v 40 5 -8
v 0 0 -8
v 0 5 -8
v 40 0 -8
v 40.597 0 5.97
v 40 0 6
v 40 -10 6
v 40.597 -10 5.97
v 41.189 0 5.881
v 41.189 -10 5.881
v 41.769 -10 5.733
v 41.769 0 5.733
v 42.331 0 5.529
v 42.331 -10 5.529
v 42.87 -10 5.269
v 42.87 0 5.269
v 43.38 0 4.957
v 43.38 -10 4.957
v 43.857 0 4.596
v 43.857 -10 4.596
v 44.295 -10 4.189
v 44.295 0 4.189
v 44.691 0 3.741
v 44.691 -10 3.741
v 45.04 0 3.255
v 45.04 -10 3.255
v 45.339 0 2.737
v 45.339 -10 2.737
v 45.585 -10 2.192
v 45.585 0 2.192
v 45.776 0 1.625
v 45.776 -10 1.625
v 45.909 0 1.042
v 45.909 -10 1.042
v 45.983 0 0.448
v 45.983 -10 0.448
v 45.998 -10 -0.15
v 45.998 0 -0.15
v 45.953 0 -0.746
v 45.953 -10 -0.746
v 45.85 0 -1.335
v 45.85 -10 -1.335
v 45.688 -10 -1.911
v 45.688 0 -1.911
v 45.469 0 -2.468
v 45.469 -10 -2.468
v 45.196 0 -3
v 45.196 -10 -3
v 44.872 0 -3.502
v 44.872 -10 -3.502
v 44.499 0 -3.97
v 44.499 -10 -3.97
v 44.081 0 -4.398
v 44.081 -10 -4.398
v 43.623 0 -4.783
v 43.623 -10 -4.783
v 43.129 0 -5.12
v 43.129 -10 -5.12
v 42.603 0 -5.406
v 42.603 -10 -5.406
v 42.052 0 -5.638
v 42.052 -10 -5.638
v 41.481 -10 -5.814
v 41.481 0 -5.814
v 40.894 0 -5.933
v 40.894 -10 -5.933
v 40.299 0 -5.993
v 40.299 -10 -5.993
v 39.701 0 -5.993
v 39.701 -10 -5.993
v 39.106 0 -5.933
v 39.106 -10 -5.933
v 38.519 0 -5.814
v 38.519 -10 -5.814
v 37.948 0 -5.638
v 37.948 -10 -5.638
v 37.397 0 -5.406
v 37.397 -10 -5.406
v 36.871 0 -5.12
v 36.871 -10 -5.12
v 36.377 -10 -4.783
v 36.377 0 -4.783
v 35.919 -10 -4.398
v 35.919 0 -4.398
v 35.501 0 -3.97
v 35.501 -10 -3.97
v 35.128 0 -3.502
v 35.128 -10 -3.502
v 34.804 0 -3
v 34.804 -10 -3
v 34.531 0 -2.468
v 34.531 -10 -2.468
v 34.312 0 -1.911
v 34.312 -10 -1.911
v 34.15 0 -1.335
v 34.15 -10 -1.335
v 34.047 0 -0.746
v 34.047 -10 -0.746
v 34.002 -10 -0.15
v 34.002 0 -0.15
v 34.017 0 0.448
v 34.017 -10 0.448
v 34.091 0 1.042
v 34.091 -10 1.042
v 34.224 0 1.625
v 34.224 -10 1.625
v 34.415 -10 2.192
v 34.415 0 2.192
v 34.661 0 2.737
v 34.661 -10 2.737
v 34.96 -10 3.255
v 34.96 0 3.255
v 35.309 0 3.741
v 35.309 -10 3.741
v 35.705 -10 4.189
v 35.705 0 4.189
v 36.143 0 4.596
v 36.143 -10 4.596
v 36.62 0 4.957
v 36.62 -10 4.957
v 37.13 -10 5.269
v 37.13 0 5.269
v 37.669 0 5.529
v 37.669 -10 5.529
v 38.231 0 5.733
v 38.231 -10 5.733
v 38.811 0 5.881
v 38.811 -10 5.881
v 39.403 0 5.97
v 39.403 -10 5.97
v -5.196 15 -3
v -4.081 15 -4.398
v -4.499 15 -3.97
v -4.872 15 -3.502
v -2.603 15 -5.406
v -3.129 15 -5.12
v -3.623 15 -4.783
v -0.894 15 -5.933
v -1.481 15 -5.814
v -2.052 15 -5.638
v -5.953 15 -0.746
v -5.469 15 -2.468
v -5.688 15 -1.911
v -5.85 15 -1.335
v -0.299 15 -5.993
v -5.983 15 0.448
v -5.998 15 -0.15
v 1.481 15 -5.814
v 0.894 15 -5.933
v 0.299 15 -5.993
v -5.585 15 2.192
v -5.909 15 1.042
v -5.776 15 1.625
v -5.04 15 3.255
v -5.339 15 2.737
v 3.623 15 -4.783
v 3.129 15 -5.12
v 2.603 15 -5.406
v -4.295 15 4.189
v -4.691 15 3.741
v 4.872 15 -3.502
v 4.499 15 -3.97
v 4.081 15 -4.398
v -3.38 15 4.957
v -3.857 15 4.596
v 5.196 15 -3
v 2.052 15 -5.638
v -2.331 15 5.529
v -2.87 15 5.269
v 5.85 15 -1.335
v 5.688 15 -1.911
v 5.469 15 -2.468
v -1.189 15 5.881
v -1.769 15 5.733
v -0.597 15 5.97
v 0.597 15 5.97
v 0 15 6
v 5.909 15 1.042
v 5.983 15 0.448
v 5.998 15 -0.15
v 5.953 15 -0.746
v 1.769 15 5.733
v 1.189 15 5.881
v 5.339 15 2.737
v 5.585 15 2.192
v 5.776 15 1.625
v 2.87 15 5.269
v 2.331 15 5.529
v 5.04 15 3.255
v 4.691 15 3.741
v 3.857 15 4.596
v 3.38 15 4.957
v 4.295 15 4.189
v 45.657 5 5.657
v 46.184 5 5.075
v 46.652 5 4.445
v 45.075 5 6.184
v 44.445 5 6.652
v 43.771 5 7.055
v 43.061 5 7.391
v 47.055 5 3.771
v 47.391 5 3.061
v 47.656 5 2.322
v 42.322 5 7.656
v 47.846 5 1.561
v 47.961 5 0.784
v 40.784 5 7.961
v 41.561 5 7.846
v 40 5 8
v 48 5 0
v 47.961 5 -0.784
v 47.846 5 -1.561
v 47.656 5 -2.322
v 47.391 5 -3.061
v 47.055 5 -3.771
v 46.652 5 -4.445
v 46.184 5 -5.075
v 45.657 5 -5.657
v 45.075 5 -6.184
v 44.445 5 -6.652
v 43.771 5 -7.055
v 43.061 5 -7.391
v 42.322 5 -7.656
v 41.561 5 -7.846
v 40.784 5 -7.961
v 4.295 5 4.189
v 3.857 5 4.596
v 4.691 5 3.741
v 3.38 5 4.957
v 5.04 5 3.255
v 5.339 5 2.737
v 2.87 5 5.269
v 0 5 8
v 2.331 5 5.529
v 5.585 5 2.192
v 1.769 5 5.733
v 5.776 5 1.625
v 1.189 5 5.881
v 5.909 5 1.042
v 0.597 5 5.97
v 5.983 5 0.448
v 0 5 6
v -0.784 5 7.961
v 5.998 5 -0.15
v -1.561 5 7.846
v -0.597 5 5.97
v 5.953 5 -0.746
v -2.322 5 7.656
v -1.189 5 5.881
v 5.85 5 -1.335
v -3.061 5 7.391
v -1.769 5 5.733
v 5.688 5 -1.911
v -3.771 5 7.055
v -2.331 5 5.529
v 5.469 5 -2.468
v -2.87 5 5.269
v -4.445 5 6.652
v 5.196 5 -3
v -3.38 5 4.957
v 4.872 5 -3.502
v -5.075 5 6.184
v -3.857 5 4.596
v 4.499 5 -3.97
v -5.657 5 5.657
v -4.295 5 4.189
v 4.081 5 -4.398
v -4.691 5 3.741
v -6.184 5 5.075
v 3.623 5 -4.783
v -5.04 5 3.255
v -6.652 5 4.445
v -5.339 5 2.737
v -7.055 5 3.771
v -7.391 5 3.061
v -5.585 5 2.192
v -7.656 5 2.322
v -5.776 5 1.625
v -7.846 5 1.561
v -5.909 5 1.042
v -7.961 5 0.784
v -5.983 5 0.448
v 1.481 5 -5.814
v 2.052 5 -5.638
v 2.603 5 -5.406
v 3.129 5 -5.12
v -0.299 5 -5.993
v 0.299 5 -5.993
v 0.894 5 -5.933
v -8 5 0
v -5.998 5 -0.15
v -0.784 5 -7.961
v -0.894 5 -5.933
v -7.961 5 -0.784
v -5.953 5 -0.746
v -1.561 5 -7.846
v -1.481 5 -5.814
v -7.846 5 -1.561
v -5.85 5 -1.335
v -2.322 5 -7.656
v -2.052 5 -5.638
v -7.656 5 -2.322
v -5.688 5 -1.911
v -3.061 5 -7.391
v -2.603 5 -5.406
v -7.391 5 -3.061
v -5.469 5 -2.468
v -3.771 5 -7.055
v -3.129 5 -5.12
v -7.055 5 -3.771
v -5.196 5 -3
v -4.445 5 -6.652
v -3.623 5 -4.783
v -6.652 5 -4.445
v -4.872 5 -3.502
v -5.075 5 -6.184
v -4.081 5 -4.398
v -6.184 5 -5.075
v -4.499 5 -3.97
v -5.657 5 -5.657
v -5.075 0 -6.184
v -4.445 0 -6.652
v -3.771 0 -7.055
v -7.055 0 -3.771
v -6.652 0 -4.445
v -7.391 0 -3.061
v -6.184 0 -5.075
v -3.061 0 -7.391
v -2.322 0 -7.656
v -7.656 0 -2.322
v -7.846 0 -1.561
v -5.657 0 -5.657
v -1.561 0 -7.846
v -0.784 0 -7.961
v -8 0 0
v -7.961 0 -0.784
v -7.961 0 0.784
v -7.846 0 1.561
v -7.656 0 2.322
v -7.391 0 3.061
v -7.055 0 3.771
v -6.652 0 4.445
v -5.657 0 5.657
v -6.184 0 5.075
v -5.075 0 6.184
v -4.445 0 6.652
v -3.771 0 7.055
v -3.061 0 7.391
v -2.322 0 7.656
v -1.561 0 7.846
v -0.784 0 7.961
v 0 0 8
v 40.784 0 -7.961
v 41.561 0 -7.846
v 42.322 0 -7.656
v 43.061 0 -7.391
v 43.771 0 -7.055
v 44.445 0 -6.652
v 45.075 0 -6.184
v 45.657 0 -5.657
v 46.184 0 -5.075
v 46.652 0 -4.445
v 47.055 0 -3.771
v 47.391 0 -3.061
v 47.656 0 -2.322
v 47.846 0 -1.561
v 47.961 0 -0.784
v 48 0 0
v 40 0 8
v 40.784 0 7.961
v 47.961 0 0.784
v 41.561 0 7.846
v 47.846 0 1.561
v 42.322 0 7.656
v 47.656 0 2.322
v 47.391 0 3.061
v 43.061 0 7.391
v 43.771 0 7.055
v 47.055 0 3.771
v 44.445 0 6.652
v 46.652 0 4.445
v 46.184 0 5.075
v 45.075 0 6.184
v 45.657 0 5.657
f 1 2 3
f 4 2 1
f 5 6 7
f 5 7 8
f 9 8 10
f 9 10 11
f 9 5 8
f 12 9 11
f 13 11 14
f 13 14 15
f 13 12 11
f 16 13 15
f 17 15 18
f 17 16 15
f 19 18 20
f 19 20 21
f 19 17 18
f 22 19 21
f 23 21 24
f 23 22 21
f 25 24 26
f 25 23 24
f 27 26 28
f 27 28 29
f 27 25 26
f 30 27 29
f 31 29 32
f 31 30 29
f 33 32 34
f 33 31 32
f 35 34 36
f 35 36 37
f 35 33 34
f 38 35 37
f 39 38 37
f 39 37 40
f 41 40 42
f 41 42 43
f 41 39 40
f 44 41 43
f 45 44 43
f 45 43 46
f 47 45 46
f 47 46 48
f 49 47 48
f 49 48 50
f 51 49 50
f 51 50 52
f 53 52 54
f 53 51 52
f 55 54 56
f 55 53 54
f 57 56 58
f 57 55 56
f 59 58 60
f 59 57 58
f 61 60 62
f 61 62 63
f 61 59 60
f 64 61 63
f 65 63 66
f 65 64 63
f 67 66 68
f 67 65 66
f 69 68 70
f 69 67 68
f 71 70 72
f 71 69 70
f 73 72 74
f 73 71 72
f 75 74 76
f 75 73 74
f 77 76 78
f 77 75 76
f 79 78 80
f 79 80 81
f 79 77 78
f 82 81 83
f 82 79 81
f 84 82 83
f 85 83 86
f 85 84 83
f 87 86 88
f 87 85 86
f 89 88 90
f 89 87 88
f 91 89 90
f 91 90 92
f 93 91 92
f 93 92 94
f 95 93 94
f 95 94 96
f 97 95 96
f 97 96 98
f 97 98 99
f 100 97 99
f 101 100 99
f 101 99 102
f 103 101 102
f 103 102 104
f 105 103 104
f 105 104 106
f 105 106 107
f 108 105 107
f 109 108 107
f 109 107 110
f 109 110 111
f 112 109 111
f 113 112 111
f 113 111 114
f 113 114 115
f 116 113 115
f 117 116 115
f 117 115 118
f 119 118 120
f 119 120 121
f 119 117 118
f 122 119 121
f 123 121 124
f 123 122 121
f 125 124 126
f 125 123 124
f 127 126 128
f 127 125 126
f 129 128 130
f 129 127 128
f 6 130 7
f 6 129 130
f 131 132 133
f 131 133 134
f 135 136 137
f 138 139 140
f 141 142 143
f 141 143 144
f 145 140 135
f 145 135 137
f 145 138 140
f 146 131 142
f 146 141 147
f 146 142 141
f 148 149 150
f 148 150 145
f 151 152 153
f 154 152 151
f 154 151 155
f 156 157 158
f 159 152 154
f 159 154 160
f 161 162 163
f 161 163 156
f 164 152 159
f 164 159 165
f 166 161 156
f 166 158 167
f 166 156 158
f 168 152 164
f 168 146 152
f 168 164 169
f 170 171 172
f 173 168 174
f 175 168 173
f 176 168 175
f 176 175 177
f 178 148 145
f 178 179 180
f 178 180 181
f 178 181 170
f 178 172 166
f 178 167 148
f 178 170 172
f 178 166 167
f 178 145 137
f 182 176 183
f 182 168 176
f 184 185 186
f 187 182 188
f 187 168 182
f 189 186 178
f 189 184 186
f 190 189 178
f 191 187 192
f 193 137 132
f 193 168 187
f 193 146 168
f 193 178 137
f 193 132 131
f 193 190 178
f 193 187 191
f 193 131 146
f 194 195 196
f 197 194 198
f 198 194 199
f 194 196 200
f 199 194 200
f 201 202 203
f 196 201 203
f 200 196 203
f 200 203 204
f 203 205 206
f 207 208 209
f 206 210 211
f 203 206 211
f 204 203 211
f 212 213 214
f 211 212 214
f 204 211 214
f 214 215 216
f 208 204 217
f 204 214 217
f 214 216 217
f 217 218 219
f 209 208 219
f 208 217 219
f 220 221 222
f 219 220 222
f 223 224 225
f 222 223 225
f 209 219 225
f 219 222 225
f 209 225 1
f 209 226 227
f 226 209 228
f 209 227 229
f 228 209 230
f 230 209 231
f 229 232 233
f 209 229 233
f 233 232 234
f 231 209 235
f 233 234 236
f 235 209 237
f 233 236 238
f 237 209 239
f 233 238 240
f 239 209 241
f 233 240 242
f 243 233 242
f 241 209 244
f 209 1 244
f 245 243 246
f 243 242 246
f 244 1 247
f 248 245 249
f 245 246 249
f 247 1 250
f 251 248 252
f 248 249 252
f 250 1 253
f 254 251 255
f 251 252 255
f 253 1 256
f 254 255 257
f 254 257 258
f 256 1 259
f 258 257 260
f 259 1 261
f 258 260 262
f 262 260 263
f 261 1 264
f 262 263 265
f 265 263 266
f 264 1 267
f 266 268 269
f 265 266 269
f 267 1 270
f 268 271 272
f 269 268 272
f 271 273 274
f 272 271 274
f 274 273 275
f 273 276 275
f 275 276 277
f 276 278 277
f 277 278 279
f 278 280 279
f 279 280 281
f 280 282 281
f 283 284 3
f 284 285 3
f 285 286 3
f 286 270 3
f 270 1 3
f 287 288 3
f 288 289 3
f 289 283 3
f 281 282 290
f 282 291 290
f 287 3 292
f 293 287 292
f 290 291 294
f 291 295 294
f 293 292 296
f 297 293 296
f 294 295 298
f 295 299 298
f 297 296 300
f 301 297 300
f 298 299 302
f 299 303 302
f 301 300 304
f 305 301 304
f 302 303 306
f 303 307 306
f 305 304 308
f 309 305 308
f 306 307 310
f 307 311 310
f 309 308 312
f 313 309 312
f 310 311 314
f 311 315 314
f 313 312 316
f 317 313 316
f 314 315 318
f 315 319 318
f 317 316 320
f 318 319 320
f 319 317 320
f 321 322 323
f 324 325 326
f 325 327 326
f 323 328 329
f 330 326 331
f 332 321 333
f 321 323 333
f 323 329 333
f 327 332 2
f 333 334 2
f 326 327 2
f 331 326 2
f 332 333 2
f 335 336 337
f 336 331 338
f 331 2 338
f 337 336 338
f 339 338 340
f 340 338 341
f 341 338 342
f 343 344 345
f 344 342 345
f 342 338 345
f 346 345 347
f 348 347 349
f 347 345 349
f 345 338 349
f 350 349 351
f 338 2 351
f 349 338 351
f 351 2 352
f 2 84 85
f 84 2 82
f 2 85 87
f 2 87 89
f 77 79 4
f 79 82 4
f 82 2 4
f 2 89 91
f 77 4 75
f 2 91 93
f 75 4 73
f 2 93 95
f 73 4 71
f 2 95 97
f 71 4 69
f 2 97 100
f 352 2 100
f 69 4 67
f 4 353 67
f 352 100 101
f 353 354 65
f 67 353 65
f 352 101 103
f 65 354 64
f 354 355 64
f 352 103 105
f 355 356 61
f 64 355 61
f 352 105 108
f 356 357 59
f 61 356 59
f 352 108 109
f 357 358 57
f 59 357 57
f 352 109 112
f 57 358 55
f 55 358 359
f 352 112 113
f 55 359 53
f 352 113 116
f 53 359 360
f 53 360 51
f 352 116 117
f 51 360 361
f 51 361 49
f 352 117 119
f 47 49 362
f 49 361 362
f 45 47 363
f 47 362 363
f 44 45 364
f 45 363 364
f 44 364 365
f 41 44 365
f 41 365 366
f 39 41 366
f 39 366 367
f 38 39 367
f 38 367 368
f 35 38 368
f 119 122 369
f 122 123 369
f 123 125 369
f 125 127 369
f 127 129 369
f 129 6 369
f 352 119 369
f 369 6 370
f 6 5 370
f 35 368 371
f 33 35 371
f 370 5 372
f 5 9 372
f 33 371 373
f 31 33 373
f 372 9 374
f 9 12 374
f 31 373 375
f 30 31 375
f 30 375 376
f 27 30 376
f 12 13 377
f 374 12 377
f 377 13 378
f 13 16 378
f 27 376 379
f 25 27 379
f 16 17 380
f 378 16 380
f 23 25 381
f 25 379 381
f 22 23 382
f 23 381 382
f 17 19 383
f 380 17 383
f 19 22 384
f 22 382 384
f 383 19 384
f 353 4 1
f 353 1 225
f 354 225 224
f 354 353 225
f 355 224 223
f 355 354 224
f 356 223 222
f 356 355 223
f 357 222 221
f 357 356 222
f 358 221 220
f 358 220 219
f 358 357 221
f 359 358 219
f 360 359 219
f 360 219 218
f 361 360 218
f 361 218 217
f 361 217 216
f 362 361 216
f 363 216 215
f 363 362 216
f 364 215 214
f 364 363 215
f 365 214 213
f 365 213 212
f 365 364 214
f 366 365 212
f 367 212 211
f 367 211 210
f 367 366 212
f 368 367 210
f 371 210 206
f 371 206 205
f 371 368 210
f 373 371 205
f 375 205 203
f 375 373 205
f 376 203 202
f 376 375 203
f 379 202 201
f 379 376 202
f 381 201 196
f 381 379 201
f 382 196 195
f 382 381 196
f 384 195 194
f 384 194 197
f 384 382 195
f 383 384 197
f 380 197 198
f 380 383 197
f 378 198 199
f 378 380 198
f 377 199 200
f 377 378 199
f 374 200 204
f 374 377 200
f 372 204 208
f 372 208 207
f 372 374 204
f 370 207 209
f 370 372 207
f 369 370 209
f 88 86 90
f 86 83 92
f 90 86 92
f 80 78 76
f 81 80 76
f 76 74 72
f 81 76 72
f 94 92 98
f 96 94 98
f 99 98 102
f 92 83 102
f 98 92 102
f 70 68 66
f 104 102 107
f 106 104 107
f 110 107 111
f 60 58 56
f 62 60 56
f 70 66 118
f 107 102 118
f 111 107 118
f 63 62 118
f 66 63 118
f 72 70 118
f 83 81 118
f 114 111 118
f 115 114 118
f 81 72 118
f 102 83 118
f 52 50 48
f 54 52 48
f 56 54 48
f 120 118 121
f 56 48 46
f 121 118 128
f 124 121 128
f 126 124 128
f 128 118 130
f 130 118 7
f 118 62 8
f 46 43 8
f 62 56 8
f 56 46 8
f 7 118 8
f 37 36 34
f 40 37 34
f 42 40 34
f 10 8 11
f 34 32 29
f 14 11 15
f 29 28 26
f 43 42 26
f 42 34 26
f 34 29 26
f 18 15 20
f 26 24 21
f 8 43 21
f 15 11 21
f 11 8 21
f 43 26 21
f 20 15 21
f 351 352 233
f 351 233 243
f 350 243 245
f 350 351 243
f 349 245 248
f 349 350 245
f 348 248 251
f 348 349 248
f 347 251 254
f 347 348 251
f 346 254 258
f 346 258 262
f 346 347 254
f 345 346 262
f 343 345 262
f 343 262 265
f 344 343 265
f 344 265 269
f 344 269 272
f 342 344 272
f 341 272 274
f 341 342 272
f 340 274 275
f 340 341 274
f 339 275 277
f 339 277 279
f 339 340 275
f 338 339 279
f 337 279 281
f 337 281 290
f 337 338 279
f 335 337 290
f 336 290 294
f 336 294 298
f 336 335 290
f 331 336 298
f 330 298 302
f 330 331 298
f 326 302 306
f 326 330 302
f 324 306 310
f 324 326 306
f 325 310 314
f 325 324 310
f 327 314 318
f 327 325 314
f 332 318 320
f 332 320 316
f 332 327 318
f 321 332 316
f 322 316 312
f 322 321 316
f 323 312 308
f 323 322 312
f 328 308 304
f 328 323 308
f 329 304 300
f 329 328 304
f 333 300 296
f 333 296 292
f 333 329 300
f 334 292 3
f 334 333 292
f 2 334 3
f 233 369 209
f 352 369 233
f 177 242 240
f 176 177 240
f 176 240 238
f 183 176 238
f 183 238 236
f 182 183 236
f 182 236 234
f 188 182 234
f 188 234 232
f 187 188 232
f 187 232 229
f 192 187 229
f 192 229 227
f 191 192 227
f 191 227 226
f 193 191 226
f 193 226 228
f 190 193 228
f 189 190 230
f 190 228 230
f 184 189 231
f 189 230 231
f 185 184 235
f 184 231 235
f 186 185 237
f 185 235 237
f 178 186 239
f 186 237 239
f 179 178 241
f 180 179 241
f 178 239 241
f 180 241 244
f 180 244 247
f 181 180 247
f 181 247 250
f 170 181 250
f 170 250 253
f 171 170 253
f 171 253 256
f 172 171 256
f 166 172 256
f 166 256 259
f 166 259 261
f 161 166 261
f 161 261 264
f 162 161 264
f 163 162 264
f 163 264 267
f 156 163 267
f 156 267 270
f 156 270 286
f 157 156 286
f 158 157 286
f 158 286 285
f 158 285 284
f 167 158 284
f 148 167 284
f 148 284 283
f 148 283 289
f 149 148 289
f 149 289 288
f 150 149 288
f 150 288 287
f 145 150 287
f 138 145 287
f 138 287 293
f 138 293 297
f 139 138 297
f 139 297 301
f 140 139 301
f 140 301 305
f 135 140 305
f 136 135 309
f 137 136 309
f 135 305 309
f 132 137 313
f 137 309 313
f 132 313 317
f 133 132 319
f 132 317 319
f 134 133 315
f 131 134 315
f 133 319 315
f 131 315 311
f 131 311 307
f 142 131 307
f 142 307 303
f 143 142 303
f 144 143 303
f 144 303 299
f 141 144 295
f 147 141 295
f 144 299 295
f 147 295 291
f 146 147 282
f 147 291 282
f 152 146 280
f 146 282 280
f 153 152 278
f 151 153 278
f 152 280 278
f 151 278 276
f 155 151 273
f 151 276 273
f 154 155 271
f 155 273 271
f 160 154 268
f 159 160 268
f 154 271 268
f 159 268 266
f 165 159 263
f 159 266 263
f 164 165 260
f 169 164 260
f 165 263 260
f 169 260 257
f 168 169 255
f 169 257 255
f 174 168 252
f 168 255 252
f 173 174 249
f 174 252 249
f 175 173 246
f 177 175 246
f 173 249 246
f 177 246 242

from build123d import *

# Parameters (mm, degrees)
BOSS_EXTRUDE1_DEPTH = 5
SKETCH1_3_R         = 6
BOSS_EXTRUDE2_DEPTH = 15
SKETCH1_4_R         = 6
BOSS_EXTRUDE3_DEPTH = 10


with BuildPart() as part:
    # Sketch1 → Boss-Extrude1 (new body)
    with BuildSketch(Plane(origin=(0, 0, 0), x_dir=(1, 0, 0), z_dir=(0, 1, 0))):
        with BuildLine():
            Line((40, 8), (0, 8))
            ThreePointArc((0, 8), (-8, 0), (0, -8))
            Line((0, -8), (40, -8))
            ThreePointArc((40, -8), (48, 0), (40, 8))
        make_face()
    extrude(amount=BOSS_EXTRUDE1_DEPTH)

    # Sketch1<3> → Boss-Extrude2 (add)
    with BuildSketch(Plane(origin=(0, 0, 0), x_dir=(1, 0, 0), z_dir=(0, 1, 0))):
        Circle(SKETCH1_3_R)
    extrude(amount=BOSS_EXTRUDE2_DEPTH)

    # Sketch1<4> → Boss-Extrude3 (add)
    with BuildSketch(Plane(origin=(0, 0, 0), x_dir=(1, 0, 0), z_dir=(0, 1, 0))):
        with Locations((40, 0)):
            Circle(SKETCH1_4_R)
    extrude(amount=-BOSS_EXTRUDE3_DEPTH)


solid = part.part
